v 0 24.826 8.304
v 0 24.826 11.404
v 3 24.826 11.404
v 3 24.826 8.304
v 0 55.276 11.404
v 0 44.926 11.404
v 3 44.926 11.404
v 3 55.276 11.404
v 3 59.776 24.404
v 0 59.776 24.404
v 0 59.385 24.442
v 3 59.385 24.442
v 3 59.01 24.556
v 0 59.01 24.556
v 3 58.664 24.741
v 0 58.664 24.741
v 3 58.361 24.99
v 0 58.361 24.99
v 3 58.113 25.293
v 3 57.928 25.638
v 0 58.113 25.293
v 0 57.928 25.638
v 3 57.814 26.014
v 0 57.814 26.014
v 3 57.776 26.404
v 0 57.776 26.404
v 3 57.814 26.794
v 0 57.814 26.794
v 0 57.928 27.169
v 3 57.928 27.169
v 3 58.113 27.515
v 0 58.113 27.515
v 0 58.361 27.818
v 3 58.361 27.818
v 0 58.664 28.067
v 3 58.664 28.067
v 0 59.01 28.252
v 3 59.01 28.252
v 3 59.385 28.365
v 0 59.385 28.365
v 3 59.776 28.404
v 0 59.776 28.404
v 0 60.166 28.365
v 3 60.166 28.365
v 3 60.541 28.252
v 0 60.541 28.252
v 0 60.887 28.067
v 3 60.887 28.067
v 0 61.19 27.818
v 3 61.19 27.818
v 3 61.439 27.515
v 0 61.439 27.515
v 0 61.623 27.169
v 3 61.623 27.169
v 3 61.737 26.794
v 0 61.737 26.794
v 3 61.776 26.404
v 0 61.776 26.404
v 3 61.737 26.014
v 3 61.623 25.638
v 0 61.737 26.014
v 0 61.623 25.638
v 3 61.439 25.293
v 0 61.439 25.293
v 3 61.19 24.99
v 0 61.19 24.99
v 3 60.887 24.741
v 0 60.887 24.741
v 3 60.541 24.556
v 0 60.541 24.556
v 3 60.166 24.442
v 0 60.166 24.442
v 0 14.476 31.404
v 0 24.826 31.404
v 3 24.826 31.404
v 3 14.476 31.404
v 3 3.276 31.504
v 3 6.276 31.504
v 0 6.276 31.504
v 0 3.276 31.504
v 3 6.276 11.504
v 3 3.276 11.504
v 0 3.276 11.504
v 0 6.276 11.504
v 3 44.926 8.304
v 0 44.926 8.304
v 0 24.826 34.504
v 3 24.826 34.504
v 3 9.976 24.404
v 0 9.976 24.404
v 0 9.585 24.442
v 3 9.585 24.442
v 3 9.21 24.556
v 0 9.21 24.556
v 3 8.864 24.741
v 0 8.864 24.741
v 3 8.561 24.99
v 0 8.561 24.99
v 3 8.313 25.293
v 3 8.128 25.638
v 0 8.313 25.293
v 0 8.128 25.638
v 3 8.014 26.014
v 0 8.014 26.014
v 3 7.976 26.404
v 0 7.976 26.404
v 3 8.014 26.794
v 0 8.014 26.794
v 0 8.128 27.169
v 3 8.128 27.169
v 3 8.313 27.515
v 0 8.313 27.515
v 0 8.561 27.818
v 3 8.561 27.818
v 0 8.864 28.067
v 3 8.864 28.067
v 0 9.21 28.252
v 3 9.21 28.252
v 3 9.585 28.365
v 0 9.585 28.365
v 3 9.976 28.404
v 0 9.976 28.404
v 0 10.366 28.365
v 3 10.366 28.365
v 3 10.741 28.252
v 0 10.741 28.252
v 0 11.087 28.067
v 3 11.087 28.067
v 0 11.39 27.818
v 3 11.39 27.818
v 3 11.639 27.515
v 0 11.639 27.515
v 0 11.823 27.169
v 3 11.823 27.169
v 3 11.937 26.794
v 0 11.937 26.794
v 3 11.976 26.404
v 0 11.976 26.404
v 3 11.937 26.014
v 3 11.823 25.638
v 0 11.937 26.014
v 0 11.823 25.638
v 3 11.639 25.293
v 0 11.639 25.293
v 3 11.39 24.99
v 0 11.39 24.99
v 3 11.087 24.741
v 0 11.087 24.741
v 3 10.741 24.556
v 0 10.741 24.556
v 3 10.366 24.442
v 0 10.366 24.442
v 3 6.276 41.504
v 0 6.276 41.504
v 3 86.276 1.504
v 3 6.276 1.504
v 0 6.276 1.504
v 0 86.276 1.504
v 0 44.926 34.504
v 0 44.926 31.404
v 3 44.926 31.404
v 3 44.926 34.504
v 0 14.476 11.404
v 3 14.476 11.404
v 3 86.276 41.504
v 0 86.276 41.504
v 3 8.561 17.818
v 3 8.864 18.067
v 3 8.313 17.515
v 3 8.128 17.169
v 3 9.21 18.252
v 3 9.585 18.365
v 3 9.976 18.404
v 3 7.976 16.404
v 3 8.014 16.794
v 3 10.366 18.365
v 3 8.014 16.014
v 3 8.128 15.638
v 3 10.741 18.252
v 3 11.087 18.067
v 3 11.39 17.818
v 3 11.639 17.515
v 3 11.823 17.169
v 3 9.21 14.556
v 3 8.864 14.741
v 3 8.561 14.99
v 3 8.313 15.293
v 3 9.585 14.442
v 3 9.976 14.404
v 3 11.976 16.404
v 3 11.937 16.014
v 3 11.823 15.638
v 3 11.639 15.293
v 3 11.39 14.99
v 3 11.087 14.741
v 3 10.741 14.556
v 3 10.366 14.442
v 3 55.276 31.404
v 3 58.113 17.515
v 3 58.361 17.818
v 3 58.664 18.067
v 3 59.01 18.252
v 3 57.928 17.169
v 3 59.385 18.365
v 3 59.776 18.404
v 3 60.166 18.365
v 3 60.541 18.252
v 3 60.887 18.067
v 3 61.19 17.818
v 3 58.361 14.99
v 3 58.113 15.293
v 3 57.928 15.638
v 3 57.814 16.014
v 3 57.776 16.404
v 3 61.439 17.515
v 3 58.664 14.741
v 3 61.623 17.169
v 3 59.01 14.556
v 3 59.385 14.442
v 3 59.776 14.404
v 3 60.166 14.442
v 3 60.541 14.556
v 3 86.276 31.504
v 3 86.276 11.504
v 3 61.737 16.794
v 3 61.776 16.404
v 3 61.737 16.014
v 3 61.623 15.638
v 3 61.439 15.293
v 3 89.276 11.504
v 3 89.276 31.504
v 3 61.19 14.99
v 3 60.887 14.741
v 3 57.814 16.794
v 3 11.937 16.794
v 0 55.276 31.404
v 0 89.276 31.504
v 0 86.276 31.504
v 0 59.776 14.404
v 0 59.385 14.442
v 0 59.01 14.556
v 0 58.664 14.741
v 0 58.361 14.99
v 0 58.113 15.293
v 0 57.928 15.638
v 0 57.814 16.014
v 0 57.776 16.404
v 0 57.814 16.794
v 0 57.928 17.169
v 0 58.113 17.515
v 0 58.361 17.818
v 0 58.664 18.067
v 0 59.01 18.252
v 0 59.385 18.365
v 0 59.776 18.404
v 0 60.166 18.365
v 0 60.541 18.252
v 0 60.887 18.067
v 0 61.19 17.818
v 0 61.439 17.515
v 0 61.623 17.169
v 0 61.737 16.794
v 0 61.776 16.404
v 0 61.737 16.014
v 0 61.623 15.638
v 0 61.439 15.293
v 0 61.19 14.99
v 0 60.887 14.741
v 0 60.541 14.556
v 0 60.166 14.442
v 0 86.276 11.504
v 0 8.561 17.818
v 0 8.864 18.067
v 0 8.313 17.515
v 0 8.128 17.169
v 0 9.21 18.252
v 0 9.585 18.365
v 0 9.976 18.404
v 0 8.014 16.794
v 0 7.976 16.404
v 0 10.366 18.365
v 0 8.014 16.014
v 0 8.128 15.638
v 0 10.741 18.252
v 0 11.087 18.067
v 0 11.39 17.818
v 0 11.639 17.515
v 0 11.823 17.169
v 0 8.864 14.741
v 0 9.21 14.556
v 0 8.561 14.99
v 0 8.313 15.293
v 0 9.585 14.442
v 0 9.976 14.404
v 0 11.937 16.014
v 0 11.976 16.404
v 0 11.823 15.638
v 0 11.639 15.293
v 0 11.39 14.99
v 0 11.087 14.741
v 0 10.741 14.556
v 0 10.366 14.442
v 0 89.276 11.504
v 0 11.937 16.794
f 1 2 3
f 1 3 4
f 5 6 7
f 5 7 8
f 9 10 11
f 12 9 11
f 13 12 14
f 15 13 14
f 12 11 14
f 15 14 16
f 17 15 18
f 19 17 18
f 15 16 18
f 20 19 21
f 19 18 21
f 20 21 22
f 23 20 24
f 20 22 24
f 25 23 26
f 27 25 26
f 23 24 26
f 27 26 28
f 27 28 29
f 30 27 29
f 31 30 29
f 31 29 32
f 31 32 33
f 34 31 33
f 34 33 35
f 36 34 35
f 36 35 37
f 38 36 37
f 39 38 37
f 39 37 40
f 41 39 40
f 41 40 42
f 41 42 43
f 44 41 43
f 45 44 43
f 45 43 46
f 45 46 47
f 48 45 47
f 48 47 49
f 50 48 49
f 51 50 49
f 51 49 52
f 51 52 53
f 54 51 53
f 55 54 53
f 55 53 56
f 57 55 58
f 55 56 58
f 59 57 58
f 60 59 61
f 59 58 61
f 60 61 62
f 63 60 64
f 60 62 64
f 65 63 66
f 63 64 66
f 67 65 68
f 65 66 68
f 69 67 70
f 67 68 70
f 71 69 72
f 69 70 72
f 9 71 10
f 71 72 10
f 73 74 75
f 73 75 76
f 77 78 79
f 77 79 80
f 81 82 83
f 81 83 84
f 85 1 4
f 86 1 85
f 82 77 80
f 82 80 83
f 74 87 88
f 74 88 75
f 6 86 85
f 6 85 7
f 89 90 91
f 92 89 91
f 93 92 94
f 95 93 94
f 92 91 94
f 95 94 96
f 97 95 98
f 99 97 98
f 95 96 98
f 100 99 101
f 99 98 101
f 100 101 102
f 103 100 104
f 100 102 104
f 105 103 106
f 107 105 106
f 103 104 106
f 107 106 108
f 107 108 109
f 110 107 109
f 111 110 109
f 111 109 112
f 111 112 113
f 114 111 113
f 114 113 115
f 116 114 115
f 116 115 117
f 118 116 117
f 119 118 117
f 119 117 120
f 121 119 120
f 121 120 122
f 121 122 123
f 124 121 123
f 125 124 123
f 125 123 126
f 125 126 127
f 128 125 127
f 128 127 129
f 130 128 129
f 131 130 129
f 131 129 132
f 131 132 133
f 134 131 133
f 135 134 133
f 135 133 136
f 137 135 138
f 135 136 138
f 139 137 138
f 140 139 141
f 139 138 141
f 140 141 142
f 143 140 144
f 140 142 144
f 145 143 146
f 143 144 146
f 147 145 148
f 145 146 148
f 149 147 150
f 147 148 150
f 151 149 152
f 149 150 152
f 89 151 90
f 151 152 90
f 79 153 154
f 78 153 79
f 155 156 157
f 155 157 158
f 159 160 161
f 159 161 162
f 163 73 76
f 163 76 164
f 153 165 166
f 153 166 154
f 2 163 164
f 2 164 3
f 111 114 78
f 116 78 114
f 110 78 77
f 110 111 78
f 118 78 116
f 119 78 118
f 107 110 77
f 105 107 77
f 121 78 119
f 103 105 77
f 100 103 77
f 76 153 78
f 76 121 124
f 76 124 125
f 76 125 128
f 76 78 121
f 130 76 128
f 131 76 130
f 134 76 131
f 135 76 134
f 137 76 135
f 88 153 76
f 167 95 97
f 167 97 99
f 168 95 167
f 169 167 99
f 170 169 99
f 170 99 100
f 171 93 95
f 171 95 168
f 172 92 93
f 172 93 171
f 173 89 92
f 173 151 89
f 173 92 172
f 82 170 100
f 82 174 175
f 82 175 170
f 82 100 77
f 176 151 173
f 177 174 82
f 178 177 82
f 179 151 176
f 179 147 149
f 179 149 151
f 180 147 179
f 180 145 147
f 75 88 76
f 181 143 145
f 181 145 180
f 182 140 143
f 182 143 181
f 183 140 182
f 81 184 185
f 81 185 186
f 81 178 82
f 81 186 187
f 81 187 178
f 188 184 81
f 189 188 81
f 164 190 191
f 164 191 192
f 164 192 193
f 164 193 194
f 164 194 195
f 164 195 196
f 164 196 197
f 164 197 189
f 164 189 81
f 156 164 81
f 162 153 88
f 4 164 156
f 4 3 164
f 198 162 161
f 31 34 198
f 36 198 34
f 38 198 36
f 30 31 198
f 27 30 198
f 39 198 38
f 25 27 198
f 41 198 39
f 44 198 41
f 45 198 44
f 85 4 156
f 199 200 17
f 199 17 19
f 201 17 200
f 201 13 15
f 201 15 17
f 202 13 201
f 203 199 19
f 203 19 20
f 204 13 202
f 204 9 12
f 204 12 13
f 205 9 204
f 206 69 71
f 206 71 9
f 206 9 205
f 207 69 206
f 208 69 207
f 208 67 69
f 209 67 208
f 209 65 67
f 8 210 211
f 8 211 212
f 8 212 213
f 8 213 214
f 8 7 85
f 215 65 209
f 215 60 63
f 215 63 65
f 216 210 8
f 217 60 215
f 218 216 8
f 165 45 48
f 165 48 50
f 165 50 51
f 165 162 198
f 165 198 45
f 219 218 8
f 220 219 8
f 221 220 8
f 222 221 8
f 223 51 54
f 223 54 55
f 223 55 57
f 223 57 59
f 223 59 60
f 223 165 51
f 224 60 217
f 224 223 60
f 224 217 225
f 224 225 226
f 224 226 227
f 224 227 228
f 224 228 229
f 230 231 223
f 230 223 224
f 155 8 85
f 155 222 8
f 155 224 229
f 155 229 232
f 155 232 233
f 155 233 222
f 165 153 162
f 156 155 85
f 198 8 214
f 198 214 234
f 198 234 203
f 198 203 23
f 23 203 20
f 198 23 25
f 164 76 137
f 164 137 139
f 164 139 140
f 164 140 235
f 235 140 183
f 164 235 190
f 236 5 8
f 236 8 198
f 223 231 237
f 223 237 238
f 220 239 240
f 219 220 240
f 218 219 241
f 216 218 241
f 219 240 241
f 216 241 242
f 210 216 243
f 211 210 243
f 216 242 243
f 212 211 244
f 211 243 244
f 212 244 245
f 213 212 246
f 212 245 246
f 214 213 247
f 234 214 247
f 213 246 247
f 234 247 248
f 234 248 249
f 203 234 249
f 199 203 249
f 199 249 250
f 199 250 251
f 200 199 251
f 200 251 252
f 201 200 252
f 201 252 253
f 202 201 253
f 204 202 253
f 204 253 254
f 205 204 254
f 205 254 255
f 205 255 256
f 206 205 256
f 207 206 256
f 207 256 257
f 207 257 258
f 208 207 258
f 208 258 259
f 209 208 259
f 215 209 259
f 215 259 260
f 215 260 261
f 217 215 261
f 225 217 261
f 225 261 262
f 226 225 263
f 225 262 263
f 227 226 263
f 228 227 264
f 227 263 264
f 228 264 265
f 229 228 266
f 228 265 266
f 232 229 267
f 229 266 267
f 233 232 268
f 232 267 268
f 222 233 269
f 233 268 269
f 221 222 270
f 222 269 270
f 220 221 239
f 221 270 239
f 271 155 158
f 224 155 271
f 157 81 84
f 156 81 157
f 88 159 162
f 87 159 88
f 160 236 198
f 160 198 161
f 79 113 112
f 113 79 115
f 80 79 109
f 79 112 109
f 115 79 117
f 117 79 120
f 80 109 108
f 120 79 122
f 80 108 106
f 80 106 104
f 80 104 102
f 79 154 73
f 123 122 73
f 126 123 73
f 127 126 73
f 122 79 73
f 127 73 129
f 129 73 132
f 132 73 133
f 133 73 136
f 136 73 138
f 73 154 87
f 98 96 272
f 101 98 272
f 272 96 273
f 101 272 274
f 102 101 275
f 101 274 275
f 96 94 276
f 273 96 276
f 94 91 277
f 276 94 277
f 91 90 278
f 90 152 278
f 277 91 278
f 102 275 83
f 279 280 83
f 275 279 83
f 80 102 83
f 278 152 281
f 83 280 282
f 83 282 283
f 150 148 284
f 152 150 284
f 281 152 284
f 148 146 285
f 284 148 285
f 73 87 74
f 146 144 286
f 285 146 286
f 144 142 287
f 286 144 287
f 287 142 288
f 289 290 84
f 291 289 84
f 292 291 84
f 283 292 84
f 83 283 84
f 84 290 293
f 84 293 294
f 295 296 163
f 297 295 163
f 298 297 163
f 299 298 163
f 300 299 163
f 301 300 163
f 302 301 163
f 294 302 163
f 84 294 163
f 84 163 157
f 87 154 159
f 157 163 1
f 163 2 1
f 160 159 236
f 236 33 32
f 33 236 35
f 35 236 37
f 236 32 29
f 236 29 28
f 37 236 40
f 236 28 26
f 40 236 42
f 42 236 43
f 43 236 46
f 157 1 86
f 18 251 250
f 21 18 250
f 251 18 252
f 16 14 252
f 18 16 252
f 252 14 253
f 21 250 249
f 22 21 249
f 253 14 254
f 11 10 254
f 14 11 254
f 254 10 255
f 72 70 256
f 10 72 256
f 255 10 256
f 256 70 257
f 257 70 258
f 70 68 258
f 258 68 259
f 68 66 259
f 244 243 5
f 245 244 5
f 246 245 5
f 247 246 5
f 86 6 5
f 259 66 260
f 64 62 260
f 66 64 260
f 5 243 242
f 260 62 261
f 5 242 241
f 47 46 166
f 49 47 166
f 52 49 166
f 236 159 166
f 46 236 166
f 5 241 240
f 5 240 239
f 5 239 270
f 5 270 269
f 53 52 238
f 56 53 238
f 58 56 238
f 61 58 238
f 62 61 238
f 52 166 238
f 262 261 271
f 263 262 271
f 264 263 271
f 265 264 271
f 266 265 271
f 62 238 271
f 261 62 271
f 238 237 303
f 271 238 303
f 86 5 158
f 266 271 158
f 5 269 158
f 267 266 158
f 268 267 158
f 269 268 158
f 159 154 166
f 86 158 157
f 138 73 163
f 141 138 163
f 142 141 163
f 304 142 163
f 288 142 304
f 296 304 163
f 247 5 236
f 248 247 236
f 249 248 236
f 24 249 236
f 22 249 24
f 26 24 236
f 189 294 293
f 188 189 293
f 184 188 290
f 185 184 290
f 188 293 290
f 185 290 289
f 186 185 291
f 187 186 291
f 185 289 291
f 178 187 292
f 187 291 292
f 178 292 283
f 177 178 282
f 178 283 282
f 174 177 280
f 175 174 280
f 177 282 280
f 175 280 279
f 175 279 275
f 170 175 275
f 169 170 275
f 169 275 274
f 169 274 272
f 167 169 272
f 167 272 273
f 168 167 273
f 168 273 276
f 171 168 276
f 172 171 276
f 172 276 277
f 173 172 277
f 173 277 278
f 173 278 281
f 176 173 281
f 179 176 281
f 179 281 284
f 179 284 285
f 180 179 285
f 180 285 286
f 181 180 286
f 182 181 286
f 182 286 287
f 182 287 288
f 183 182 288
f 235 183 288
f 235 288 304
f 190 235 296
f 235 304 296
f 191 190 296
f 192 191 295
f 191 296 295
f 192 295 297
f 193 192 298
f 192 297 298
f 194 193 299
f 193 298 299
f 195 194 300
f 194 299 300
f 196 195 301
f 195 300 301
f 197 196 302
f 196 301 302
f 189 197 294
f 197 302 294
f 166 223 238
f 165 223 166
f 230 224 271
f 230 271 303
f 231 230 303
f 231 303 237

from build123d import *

# Parameters (mm, degrees)
BOSS_EXTRU_1_DEPTH      = 3
ESQUISSE2_R             = 2
ENL_V_MAT_EXTRU_1_DEPTH = 99.4971691


with BuildPart() as part:
    # Esquisse1 → Boss.-Extru.1 (new body)
    with BuildSketch(Plane(origin=(3, 0, 0), x_dir=(0, 0, -1), z_dir=(1, 0, 0))):
        Polygon((-31.50377455, 89.275579073), (-31.50377455, 86.275579073), (-41.50377455, 86.275579073), (-41.50377455, 6.275579073), (-31.50377455, 6.275579073), (-31.50377455, 3.275579073), (-11.50377455, 3.275579073), (-11.50377455, 6.275579073), (-1.50377455, 6.275579073), (-1.50377455, 86.275579073), (-11.50377455, 86.275579073), (-11.50377455, 89.275579073), align=None)
    extrude(amount=-BOSS_EXTRU_1_DEPTH)

    # Esquisse2 → Enlèv. mat.-Extru.1 (cut, through all)
    with BuildSketch(Plane.ZY):
        with Locations(Location((26.40377455, 9.975579073, 0), (0, 0, 180))):
            Circle(ESQUISSE2_R)
        with Locations(Location((16.40377455, 59.775579073, 0), (0, 0, 180))):
            Circle(ESQUISSE2_R)
        with Locations(Location((26.40377455, 59.775579073, 0), (0, 0, 180))):
            Circle(ESQUISSE2_R)
        with Locations(Location((16.40377455, 9.975579073, 0), (0, 0, 180))):
            Circle(ESQUISSE2_R)
        Polygon((11.40377455, 44.925579073), (11.40377455, 55.275579073), (31.40377455, 55.275579073), (31.40377455, 44.925579073), (34.50377455, 44.925579073), (34.50377455, 24.825579073), (31.40377455, 24.825579073), (31.40377455, 14.475579073), (11.40377455, 14.475579073), (11.40377455, 24.825579073), (8.30377455, 24.825579073), (8.30377455, 44.925579073), align=None)
    extrude(amount=-ENL_V_MAT_EXTRU_1_DEPTH, mode=Mode.SUBTRACT)


solid = part.part
